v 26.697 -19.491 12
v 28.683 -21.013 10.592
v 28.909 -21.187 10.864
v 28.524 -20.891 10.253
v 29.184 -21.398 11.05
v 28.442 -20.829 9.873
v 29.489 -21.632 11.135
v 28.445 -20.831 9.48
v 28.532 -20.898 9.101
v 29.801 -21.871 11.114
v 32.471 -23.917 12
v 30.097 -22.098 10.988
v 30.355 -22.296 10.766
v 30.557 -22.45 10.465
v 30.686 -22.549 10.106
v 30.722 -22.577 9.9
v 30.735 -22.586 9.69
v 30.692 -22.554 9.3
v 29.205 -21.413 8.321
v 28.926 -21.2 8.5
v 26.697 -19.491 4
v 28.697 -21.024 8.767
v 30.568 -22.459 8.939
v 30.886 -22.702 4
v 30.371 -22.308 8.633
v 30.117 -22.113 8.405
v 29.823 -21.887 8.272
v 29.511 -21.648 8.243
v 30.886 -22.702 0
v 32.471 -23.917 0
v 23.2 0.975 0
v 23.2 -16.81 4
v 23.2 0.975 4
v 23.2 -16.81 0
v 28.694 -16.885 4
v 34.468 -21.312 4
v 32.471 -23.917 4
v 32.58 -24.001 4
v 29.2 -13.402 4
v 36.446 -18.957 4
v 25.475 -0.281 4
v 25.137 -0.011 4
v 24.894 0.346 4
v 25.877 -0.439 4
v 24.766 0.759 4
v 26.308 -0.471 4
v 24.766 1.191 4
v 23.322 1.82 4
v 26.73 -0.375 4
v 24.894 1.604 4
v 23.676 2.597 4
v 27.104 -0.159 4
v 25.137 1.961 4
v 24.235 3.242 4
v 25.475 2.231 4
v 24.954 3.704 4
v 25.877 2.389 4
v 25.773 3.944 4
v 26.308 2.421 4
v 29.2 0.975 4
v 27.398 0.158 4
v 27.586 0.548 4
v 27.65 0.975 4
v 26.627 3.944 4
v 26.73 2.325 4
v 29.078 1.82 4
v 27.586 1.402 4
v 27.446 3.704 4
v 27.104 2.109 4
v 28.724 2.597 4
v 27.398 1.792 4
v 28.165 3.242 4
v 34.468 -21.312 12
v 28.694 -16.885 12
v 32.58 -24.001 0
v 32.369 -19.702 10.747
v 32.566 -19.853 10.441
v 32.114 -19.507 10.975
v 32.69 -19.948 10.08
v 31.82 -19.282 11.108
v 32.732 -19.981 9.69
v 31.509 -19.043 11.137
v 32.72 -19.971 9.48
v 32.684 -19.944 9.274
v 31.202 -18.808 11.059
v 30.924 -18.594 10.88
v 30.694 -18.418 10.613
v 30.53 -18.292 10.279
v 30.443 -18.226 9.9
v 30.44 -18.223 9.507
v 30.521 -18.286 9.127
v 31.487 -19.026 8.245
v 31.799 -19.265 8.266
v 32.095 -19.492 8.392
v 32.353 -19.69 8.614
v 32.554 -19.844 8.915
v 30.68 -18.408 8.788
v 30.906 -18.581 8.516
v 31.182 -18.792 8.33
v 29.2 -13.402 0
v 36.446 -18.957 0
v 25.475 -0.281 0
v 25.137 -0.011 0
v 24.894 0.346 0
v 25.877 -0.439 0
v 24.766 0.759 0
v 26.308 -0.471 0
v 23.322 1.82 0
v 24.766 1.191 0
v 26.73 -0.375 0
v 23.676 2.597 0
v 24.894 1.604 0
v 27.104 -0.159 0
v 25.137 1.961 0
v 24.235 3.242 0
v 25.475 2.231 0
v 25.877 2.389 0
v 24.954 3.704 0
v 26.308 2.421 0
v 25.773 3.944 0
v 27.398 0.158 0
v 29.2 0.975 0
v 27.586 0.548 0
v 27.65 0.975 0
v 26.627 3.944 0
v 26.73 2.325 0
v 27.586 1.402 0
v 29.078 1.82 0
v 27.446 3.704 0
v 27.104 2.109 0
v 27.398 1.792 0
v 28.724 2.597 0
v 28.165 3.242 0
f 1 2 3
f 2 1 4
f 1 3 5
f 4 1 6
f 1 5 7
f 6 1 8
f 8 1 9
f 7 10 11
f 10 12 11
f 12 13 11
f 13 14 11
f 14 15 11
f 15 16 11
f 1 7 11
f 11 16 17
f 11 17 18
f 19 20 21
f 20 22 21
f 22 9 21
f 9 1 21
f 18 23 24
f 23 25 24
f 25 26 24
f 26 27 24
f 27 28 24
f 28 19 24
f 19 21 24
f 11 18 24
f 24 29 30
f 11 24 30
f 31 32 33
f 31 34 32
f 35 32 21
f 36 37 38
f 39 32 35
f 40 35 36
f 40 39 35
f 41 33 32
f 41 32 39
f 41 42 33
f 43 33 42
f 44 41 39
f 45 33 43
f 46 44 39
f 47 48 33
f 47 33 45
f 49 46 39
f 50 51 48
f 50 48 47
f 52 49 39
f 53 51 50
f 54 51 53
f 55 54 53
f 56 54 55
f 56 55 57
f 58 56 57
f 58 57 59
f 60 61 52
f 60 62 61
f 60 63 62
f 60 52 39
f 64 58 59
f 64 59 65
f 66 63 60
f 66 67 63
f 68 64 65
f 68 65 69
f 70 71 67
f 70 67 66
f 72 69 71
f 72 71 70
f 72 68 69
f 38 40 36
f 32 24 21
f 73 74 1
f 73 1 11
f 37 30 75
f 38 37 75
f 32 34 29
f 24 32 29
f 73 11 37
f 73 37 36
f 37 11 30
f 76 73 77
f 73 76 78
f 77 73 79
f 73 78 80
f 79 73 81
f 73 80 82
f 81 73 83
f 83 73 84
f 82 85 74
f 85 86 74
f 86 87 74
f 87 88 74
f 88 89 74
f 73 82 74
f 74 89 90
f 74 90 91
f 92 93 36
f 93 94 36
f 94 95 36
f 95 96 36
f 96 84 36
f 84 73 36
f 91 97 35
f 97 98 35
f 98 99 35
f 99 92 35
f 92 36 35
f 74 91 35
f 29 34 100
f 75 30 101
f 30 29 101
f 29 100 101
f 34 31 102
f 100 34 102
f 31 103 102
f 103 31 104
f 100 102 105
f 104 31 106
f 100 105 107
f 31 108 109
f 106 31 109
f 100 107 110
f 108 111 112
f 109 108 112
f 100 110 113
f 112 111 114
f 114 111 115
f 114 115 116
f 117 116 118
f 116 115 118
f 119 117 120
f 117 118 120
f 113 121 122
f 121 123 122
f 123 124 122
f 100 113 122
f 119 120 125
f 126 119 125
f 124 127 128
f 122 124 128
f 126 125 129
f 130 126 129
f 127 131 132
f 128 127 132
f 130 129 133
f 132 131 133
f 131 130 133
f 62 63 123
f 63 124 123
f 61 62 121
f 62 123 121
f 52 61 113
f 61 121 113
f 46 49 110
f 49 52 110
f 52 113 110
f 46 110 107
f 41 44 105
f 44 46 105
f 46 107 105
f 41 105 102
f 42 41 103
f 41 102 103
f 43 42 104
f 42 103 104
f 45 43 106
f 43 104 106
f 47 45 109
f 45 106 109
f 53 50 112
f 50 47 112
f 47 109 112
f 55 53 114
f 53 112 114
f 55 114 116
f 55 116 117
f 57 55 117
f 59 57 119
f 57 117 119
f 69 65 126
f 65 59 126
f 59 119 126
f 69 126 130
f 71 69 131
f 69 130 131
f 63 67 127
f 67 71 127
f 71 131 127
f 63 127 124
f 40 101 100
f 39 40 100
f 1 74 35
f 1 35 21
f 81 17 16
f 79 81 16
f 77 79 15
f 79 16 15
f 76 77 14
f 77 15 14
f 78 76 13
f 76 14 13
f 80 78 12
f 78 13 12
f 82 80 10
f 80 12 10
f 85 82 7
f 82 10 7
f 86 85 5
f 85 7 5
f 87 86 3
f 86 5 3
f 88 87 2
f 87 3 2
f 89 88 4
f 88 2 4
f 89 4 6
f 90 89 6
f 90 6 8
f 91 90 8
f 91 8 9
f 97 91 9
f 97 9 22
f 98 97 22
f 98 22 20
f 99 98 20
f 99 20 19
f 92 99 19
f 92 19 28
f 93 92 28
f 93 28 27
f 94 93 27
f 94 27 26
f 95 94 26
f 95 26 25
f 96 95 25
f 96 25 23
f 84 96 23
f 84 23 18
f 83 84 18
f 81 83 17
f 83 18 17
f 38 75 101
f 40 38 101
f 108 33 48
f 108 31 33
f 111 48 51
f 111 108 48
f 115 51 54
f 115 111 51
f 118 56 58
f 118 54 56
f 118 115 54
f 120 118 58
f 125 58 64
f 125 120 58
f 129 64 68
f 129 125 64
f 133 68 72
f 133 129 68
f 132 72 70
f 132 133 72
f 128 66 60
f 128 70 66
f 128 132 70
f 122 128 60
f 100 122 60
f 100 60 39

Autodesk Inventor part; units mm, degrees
ref_plane "YZ Plane" through (0, 0, 0) normal (1, 0, 0) x (0, 1, 0)
ref_plane "XZ Plane" through (0, 0, 0) normal (0, 1, 0) x (-1, 0, 0)
ref_plane "XY Plane" through (0, 0, 0) normal (0, 0, 1) x (1, 0, 0)
sketch "Szkic1" plane through (0, 0, 0) normal (0, 0, 1) x (1, 0, 0)
  circle A0 centre (26.2, 0.975) radius 1.45 projected
  circle A1 centre (26.2, 0.975) radius 3
  line L0 (29.2, 0.975) -> (29.2, -8.7925)
  line L1 (23.2, -7.0757) -> (23.2, 0.975)
  line L2 (16.8275, -11.925) -> (-16.8275, 13.875) construction
  line L3 (23.2, -7.0757) -> (23.2, -16.8102)
  line L4 (23.2, -16.8102) -> (32.5797, -24.0007)
  line L5 (32.5797, -24.0007) -> (36.4465, -18.9567)
  line L6 (36.4465, -18.9567) -> (29.2, -13.4015)
  line L7 (29.2, -13.4015) -> (29.2, -8.7925)
  point P0 (0, 0)
  point P1 (29.2, -14.7925)
  point P2 (18.5681, -14.7925)
  point P3 (15.1107, -9.0757)
  point P4 (23.2, -9.0757)
  dimension "d5" = 6
  dimension "d12" = 2
  dimension "d13" = 6
extrude "Wyciągnięcie proste1" add sketch "Szkic1" along normal blind 4
sketch "Szkic4" plane through (0, 0, 4) normal (0, 0, 1) x (1, 0, 0)
  line L0 (34.4685, -21.3117) -> (28.6942, -16.8851)
  line L1 (16.8275, -11.925) -> (-16.8275, 13.875) construction
  line L2 (28.6942, -16.8851) -> (26.6967, -19.4907)
  line L3 (26.6967, -19.4907) -> (32.471, -23.9174)
  line L4 (32.471, -23.9174) -> (34.4685, -21.3117)
  line L5 (15.6301, -11.0071) -> (20.5681, -14.7925) projected
  line L6 (17.1107, -9.0757) -> (15.6301, -11.0071) projected
  point P0 (0, 0)
extrude "Wyciągnięcie proste2" add sketch "Szkic4" along normal blind 8 and the other way blind 4
sketch "Szkic6" plane through (23.2, -16.8102, 0) normal (-0.6084, -0.7936, 0) x (0.7936, -0.6084, 0)
  circle A0 centre (8.0439, 9.69) radius 1.45
  point P0 (-28.6395, 0)
  dimension "d21" = 2.9
extrude "Wyciągnięcie proste4" cut sketch "Szkic6" against normal blind 7
equation "\"d12\" = d11"
equation "\"d11\" = d7"
equation "\"d7\" = 2"
properties part number "mirror_arm_2"
